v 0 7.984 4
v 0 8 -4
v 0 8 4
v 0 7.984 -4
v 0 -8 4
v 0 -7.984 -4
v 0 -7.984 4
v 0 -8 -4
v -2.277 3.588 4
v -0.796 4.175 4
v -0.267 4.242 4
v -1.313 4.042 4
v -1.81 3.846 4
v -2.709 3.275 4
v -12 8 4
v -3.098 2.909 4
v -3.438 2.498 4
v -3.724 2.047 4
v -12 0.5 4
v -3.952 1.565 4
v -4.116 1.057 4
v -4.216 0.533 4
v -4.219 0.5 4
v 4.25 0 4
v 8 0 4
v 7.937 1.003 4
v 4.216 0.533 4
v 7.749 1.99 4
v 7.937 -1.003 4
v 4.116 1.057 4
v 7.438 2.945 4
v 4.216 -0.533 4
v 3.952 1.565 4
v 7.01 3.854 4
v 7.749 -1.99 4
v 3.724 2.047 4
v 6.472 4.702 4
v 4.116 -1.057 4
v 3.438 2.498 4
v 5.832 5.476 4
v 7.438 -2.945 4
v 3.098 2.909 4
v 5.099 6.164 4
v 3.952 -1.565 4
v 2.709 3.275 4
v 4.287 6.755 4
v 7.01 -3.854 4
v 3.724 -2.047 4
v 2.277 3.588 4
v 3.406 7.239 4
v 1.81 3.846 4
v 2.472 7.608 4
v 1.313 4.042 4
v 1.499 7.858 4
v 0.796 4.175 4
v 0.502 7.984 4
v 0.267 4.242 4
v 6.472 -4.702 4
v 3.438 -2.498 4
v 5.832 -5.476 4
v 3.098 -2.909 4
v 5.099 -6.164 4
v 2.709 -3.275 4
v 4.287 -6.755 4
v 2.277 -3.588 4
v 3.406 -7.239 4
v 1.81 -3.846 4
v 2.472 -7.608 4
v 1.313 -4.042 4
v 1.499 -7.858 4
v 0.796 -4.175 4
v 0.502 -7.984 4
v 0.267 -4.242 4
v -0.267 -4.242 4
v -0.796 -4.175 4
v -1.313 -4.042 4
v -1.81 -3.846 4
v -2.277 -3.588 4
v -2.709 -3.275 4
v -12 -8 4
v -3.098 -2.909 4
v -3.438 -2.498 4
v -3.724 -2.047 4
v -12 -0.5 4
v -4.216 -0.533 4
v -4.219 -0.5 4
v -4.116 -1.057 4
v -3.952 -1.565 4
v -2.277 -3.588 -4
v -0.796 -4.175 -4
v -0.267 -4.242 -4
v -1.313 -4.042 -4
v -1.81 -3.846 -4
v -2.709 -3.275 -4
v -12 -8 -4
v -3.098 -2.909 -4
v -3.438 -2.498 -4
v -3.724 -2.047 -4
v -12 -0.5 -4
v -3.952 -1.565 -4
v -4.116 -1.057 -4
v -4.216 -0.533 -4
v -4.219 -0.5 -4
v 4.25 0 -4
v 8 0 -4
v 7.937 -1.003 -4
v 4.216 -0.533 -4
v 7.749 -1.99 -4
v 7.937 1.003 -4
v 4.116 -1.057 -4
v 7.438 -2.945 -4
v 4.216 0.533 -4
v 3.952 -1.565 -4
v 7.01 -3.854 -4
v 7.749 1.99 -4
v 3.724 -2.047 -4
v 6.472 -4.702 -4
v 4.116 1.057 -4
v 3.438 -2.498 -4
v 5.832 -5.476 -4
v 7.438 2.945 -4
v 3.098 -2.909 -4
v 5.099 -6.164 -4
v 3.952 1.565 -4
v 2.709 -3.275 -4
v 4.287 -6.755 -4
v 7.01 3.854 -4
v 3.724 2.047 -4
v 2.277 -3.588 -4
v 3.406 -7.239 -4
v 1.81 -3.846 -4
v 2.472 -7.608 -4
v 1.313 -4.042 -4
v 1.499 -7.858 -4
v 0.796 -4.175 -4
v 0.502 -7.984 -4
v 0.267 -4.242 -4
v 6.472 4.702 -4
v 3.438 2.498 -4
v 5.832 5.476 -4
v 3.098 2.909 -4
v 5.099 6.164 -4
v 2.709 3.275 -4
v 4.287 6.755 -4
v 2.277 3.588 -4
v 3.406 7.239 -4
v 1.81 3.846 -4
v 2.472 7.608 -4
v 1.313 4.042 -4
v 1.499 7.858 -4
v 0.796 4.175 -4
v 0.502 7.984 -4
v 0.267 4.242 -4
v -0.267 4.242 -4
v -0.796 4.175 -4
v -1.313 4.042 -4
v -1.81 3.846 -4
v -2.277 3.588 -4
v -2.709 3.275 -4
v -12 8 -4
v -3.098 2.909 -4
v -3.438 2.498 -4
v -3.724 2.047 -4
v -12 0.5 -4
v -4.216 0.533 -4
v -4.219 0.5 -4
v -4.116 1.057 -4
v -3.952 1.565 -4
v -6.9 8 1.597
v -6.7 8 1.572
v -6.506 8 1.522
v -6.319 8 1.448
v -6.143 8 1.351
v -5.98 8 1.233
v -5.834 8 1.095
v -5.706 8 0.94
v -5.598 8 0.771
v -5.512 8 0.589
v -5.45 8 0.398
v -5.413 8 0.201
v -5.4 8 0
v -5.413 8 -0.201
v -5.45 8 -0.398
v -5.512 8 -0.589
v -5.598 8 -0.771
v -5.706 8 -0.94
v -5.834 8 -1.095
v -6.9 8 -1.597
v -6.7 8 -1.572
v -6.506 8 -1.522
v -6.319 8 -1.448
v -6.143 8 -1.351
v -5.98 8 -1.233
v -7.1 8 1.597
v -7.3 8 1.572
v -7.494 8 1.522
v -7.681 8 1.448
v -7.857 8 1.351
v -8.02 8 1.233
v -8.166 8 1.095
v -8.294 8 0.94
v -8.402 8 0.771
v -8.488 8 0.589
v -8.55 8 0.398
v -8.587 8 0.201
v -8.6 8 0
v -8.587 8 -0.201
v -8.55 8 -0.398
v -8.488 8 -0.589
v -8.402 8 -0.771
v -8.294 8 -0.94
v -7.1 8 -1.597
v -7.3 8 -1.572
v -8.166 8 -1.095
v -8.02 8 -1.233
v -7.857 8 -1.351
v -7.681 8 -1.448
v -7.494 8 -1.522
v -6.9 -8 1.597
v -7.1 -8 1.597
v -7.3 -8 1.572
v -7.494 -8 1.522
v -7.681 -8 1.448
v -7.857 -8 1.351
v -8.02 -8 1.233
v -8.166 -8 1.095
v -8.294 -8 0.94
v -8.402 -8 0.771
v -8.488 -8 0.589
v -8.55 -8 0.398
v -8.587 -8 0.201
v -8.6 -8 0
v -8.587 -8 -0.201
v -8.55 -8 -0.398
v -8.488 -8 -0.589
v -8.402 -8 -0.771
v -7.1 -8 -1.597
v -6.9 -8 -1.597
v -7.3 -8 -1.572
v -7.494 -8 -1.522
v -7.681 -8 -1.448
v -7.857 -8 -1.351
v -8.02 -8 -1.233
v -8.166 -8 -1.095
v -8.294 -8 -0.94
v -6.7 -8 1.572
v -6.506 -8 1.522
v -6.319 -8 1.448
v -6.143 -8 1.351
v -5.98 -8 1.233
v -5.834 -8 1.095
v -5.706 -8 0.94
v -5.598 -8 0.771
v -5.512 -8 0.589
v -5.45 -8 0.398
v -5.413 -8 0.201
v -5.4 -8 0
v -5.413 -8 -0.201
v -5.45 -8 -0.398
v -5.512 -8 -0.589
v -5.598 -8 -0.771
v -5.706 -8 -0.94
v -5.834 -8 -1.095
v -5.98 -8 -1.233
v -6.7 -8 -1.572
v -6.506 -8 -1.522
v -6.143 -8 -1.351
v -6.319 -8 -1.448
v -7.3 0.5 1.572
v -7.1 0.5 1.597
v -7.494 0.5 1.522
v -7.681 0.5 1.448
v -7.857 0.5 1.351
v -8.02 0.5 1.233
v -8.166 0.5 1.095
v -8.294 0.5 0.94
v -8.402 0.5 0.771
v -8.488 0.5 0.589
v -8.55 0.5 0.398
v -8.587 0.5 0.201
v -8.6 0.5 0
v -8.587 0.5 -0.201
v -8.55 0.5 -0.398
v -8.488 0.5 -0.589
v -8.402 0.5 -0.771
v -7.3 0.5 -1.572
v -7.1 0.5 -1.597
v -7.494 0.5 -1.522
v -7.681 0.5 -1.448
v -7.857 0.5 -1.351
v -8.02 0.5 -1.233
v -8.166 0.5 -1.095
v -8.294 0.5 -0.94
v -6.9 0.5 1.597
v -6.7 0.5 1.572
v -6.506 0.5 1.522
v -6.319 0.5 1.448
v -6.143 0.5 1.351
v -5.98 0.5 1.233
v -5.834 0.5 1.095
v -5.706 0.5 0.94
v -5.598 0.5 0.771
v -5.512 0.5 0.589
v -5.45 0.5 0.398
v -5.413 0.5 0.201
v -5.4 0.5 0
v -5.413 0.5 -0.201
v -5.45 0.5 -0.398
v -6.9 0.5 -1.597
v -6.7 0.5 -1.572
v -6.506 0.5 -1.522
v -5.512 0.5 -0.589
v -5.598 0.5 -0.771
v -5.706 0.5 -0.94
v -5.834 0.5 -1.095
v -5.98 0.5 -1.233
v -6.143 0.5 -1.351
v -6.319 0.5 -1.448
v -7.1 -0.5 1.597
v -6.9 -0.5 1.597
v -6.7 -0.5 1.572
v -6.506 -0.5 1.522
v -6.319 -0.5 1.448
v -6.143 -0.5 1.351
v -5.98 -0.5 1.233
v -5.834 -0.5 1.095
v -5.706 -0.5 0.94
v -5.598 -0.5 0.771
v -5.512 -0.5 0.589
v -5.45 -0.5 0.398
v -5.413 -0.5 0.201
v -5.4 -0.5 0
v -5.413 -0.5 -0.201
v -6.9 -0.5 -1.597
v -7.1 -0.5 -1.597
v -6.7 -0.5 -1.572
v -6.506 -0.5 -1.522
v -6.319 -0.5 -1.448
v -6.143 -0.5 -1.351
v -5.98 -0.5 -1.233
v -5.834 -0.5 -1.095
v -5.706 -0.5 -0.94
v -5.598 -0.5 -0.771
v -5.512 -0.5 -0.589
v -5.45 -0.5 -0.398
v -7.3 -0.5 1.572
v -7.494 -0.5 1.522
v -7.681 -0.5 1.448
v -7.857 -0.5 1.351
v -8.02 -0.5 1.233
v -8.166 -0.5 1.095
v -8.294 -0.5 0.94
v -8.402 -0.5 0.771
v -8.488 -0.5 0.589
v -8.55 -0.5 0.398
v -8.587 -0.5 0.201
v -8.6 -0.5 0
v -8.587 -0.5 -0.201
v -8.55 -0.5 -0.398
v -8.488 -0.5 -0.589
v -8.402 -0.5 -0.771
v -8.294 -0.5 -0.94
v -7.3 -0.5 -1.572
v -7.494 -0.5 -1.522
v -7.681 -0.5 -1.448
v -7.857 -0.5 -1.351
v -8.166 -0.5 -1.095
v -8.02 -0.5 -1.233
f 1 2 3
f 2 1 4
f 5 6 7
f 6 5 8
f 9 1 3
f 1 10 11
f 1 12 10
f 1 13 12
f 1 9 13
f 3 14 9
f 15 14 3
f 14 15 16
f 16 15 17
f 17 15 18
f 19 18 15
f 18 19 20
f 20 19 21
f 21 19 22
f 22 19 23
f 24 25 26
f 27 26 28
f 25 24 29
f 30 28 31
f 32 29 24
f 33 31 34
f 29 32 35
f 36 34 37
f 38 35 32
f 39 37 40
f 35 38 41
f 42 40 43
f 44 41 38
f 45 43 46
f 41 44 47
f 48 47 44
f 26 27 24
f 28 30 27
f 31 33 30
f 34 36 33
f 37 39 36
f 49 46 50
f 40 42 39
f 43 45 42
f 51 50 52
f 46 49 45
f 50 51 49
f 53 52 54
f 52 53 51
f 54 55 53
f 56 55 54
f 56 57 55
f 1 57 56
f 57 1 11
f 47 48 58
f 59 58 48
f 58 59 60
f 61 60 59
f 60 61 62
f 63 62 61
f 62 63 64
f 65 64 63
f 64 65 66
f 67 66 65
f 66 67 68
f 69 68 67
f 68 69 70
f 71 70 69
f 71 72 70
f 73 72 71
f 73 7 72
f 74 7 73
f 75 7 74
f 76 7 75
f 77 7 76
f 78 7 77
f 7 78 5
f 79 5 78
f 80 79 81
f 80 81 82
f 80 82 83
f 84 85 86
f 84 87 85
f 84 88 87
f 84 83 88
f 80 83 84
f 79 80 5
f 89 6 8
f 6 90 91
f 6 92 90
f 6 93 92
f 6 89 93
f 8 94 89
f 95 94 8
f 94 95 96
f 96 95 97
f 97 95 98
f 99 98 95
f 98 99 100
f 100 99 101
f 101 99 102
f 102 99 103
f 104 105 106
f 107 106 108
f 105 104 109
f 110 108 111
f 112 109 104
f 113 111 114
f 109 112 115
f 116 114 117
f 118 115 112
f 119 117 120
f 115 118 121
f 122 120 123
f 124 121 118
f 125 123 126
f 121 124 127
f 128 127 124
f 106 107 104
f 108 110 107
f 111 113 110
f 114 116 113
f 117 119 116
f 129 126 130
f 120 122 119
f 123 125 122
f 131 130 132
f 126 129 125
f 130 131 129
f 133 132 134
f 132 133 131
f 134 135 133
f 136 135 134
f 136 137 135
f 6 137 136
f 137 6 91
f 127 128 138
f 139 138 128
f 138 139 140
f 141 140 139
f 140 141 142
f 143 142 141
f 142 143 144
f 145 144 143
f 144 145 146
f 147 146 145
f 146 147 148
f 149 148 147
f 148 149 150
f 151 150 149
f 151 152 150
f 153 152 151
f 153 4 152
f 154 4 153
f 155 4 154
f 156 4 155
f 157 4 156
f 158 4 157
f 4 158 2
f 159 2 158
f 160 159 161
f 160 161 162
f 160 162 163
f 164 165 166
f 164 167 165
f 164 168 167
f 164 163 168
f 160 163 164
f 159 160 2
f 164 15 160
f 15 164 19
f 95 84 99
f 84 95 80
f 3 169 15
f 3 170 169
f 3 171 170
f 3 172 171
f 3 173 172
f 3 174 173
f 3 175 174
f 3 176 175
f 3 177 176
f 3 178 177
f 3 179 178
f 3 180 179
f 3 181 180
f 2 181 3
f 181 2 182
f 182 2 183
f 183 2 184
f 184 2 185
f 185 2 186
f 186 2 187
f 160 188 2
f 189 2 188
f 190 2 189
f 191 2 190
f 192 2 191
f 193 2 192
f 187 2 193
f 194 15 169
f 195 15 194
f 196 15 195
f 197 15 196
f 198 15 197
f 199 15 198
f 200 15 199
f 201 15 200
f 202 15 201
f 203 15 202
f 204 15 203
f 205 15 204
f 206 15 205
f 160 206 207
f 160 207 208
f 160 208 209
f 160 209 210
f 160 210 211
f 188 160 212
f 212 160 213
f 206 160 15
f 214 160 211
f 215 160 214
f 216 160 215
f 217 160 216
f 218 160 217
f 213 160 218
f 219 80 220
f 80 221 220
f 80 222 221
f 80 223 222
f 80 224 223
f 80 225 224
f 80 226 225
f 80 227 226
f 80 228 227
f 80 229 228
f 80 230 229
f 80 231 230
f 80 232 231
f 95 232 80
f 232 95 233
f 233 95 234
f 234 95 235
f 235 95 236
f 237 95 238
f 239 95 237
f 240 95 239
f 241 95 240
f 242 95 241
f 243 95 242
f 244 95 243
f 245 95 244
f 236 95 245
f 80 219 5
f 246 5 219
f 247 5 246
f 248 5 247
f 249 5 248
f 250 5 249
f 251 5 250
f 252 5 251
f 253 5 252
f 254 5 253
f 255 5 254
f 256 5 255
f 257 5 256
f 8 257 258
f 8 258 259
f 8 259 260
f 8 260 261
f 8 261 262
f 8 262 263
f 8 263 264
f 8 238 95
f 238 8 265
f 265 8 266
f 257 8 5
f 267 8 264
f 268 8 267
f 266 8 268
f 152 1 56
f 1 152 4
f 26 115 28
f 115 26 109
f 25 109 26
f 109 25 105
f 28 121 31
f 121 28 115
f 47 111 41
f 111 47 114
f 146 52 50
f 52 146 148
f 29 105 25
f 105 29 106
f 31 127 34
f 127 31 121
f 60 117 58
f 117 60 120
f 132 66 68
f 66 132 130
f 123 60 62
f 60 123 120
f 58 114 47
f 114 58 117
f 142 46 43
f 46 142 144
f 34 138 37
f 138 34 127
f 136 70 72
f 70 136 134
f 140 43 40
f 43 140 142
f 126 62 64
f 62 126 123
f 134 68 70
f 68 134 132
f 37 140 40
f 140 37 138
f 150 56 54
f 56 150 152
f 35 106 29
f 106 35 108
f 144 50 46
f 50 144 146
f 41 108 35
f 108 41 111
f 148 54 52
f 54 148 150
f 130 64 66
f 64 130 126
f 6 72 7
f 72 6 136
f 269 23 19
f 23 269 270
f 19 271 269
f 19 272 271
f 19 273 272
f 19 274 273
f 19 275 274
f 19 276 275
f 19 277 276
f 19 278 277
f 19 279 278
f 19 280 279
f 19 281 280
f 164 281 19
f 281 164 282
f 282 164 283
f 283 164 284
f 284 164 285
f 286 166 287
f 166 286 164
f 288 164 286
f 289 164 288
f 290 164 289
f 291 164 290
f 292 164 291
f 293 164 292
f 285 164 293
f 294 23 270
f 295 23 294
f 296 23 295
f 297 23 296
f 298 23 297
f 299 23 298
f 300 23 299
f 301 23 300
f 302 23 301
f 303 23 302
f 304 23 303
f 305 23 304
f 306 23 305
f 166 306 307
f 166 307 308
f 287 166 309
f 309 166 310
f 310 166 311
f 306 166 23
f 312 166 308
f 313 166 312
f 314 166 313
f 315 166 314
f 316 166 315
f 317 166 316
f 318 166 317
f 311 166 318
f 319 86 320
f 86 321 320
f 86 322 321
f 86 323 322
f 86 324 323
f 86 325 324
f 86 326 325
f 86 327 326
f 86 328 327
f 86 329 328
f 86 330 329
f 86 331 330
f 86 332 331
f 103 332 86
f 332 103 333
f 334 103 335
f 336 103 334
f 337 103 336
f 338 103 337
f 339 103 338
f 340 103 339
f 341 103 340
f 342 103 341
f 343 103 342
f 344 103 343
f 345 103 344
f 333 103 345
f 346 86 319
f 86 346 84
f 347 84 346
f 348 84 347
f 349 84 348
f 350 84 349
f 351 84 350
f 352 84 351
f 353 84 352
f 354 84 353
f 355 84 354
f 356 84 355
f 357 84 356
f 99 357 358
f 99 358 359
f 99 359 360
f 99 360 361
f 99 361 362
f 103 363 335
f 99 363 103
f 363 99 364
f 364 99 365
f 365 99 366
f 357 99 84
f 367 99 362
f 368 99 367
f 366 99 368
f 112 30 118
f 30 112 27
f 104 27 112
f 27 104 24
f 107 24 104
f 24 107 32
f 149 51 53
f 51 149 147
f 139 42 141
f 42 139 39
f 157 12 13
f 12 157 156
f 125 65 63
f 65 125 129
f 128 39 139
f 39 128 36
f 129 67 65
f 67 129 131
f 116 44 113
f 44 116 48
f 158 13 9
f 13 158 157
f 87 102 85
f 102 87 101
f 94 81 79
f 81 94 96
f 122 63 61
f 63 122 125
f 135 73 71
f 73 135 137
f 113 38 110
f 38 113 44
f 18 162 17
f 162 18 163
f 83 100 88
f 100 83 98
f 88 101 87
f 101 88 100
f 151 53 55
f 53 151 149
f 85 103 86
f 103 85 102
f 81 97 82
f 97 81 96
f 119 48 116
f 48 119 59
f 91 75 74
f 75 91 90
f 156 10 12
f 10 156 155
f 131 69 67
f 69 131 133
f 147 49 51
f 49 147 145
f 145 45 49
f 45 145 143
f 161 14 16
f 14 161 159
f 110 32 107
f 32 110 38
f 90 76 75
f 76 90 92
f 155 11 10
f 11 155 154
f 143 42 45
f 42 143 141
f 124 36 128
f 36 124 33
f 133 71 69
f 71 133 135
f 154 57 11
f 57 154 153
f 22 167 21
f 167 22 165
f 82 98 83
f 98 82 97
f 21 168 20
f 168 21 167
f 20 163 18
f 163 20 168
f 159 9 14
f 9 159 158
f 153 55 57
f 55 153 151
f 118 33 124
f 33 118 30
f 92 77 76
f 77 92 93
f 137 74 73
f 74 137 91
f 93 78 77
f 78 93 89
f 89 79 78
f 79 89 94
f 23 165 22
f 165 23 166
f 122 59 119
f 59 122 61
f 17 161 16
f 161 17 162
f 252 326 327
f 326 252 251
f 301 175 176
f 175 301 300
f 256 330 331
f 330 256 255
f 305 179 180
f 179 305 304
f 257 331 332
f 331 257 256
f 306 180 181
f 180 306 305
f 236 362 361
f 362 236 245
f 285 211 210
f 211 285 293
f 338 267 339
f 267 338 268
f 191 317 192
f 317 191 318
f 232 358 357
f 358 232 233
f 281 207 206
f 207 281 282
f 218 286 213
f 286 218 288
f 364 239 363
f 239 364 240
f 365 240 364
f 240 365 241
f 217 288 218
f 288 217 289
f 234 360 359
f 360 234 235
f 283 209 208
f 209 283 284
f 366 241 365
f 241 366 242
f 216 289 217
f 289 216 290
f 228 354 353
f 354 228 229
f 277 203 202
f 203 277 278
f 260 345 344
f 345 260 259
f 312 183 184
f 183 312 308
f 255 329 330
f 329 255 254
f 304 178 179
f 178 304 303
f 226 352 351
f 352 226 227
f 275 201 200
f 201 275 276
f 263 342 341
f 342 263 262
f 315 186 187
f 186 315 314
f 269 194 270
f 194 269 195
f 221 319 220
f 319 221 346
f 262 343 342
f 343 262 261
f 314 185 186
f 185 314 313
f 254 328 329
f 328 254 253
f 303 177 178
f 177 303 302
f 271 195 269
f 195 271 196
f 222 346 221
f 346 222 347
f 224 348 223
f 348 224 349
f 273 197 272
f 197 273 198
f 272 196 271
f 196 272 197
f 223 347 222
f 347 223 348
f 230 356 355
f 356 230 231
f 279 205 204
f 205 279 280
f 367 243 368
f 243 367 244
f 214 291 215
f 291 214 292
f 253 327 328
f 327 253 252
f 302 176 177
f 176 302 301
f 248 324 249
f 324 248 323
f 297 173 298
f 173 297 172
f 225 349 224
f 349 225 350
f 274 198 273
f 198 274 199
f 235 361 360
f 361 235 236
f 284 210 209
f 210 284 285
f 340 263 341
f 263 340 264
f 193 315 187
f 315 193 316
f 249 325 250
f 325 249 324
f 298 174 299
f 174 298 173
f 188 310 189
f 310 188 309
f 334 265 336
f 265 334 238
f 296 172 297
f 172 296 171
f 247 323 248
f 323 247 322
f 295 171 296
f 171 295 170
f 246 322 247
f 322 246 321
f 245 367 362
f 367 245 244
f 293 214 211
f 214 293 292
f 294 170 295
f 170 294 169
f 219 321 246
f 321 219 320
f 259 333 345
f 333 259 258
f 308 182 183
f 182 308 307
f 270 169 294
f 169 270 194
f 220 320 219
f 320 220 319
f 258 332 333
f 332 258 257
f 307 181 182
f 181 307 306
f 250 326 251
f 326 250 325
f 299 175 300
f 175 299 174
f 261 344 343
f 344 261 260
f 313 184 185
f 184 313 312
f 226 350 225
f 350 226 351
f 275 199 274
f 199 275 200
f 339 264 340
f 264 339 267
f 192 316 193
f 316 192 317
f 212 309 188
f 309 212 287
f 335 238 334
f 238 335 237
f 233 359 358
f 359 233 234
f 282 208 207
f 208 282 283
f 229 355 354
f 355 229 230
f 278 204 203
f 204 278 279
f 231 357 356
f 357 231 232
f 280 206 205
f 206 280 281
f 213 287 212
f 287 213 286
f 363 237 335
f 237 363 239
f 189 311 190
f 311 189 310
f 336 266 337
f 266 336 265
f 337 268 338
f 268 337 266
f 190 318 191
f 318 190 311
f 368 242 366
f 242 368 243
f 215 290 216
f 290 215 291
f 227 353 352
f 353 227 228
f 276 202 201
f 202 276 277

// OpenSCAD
height=8;
radius=4.25;
difference(){
union(){
translate([-6,0,0]) cube([12,16,height],center=true);
cylinder(h=height,r=8, center=true, $fn=50);
}
translate([-10,0,0]) cube([20,1,height+4],center=true);
cylinder(h=30,r=radius, center=true, $fn=50);
translate([-7,0,0]) rotate([90,0,0]) cylinder(h=30,r=1.6, center=true, $fn=50);
}
